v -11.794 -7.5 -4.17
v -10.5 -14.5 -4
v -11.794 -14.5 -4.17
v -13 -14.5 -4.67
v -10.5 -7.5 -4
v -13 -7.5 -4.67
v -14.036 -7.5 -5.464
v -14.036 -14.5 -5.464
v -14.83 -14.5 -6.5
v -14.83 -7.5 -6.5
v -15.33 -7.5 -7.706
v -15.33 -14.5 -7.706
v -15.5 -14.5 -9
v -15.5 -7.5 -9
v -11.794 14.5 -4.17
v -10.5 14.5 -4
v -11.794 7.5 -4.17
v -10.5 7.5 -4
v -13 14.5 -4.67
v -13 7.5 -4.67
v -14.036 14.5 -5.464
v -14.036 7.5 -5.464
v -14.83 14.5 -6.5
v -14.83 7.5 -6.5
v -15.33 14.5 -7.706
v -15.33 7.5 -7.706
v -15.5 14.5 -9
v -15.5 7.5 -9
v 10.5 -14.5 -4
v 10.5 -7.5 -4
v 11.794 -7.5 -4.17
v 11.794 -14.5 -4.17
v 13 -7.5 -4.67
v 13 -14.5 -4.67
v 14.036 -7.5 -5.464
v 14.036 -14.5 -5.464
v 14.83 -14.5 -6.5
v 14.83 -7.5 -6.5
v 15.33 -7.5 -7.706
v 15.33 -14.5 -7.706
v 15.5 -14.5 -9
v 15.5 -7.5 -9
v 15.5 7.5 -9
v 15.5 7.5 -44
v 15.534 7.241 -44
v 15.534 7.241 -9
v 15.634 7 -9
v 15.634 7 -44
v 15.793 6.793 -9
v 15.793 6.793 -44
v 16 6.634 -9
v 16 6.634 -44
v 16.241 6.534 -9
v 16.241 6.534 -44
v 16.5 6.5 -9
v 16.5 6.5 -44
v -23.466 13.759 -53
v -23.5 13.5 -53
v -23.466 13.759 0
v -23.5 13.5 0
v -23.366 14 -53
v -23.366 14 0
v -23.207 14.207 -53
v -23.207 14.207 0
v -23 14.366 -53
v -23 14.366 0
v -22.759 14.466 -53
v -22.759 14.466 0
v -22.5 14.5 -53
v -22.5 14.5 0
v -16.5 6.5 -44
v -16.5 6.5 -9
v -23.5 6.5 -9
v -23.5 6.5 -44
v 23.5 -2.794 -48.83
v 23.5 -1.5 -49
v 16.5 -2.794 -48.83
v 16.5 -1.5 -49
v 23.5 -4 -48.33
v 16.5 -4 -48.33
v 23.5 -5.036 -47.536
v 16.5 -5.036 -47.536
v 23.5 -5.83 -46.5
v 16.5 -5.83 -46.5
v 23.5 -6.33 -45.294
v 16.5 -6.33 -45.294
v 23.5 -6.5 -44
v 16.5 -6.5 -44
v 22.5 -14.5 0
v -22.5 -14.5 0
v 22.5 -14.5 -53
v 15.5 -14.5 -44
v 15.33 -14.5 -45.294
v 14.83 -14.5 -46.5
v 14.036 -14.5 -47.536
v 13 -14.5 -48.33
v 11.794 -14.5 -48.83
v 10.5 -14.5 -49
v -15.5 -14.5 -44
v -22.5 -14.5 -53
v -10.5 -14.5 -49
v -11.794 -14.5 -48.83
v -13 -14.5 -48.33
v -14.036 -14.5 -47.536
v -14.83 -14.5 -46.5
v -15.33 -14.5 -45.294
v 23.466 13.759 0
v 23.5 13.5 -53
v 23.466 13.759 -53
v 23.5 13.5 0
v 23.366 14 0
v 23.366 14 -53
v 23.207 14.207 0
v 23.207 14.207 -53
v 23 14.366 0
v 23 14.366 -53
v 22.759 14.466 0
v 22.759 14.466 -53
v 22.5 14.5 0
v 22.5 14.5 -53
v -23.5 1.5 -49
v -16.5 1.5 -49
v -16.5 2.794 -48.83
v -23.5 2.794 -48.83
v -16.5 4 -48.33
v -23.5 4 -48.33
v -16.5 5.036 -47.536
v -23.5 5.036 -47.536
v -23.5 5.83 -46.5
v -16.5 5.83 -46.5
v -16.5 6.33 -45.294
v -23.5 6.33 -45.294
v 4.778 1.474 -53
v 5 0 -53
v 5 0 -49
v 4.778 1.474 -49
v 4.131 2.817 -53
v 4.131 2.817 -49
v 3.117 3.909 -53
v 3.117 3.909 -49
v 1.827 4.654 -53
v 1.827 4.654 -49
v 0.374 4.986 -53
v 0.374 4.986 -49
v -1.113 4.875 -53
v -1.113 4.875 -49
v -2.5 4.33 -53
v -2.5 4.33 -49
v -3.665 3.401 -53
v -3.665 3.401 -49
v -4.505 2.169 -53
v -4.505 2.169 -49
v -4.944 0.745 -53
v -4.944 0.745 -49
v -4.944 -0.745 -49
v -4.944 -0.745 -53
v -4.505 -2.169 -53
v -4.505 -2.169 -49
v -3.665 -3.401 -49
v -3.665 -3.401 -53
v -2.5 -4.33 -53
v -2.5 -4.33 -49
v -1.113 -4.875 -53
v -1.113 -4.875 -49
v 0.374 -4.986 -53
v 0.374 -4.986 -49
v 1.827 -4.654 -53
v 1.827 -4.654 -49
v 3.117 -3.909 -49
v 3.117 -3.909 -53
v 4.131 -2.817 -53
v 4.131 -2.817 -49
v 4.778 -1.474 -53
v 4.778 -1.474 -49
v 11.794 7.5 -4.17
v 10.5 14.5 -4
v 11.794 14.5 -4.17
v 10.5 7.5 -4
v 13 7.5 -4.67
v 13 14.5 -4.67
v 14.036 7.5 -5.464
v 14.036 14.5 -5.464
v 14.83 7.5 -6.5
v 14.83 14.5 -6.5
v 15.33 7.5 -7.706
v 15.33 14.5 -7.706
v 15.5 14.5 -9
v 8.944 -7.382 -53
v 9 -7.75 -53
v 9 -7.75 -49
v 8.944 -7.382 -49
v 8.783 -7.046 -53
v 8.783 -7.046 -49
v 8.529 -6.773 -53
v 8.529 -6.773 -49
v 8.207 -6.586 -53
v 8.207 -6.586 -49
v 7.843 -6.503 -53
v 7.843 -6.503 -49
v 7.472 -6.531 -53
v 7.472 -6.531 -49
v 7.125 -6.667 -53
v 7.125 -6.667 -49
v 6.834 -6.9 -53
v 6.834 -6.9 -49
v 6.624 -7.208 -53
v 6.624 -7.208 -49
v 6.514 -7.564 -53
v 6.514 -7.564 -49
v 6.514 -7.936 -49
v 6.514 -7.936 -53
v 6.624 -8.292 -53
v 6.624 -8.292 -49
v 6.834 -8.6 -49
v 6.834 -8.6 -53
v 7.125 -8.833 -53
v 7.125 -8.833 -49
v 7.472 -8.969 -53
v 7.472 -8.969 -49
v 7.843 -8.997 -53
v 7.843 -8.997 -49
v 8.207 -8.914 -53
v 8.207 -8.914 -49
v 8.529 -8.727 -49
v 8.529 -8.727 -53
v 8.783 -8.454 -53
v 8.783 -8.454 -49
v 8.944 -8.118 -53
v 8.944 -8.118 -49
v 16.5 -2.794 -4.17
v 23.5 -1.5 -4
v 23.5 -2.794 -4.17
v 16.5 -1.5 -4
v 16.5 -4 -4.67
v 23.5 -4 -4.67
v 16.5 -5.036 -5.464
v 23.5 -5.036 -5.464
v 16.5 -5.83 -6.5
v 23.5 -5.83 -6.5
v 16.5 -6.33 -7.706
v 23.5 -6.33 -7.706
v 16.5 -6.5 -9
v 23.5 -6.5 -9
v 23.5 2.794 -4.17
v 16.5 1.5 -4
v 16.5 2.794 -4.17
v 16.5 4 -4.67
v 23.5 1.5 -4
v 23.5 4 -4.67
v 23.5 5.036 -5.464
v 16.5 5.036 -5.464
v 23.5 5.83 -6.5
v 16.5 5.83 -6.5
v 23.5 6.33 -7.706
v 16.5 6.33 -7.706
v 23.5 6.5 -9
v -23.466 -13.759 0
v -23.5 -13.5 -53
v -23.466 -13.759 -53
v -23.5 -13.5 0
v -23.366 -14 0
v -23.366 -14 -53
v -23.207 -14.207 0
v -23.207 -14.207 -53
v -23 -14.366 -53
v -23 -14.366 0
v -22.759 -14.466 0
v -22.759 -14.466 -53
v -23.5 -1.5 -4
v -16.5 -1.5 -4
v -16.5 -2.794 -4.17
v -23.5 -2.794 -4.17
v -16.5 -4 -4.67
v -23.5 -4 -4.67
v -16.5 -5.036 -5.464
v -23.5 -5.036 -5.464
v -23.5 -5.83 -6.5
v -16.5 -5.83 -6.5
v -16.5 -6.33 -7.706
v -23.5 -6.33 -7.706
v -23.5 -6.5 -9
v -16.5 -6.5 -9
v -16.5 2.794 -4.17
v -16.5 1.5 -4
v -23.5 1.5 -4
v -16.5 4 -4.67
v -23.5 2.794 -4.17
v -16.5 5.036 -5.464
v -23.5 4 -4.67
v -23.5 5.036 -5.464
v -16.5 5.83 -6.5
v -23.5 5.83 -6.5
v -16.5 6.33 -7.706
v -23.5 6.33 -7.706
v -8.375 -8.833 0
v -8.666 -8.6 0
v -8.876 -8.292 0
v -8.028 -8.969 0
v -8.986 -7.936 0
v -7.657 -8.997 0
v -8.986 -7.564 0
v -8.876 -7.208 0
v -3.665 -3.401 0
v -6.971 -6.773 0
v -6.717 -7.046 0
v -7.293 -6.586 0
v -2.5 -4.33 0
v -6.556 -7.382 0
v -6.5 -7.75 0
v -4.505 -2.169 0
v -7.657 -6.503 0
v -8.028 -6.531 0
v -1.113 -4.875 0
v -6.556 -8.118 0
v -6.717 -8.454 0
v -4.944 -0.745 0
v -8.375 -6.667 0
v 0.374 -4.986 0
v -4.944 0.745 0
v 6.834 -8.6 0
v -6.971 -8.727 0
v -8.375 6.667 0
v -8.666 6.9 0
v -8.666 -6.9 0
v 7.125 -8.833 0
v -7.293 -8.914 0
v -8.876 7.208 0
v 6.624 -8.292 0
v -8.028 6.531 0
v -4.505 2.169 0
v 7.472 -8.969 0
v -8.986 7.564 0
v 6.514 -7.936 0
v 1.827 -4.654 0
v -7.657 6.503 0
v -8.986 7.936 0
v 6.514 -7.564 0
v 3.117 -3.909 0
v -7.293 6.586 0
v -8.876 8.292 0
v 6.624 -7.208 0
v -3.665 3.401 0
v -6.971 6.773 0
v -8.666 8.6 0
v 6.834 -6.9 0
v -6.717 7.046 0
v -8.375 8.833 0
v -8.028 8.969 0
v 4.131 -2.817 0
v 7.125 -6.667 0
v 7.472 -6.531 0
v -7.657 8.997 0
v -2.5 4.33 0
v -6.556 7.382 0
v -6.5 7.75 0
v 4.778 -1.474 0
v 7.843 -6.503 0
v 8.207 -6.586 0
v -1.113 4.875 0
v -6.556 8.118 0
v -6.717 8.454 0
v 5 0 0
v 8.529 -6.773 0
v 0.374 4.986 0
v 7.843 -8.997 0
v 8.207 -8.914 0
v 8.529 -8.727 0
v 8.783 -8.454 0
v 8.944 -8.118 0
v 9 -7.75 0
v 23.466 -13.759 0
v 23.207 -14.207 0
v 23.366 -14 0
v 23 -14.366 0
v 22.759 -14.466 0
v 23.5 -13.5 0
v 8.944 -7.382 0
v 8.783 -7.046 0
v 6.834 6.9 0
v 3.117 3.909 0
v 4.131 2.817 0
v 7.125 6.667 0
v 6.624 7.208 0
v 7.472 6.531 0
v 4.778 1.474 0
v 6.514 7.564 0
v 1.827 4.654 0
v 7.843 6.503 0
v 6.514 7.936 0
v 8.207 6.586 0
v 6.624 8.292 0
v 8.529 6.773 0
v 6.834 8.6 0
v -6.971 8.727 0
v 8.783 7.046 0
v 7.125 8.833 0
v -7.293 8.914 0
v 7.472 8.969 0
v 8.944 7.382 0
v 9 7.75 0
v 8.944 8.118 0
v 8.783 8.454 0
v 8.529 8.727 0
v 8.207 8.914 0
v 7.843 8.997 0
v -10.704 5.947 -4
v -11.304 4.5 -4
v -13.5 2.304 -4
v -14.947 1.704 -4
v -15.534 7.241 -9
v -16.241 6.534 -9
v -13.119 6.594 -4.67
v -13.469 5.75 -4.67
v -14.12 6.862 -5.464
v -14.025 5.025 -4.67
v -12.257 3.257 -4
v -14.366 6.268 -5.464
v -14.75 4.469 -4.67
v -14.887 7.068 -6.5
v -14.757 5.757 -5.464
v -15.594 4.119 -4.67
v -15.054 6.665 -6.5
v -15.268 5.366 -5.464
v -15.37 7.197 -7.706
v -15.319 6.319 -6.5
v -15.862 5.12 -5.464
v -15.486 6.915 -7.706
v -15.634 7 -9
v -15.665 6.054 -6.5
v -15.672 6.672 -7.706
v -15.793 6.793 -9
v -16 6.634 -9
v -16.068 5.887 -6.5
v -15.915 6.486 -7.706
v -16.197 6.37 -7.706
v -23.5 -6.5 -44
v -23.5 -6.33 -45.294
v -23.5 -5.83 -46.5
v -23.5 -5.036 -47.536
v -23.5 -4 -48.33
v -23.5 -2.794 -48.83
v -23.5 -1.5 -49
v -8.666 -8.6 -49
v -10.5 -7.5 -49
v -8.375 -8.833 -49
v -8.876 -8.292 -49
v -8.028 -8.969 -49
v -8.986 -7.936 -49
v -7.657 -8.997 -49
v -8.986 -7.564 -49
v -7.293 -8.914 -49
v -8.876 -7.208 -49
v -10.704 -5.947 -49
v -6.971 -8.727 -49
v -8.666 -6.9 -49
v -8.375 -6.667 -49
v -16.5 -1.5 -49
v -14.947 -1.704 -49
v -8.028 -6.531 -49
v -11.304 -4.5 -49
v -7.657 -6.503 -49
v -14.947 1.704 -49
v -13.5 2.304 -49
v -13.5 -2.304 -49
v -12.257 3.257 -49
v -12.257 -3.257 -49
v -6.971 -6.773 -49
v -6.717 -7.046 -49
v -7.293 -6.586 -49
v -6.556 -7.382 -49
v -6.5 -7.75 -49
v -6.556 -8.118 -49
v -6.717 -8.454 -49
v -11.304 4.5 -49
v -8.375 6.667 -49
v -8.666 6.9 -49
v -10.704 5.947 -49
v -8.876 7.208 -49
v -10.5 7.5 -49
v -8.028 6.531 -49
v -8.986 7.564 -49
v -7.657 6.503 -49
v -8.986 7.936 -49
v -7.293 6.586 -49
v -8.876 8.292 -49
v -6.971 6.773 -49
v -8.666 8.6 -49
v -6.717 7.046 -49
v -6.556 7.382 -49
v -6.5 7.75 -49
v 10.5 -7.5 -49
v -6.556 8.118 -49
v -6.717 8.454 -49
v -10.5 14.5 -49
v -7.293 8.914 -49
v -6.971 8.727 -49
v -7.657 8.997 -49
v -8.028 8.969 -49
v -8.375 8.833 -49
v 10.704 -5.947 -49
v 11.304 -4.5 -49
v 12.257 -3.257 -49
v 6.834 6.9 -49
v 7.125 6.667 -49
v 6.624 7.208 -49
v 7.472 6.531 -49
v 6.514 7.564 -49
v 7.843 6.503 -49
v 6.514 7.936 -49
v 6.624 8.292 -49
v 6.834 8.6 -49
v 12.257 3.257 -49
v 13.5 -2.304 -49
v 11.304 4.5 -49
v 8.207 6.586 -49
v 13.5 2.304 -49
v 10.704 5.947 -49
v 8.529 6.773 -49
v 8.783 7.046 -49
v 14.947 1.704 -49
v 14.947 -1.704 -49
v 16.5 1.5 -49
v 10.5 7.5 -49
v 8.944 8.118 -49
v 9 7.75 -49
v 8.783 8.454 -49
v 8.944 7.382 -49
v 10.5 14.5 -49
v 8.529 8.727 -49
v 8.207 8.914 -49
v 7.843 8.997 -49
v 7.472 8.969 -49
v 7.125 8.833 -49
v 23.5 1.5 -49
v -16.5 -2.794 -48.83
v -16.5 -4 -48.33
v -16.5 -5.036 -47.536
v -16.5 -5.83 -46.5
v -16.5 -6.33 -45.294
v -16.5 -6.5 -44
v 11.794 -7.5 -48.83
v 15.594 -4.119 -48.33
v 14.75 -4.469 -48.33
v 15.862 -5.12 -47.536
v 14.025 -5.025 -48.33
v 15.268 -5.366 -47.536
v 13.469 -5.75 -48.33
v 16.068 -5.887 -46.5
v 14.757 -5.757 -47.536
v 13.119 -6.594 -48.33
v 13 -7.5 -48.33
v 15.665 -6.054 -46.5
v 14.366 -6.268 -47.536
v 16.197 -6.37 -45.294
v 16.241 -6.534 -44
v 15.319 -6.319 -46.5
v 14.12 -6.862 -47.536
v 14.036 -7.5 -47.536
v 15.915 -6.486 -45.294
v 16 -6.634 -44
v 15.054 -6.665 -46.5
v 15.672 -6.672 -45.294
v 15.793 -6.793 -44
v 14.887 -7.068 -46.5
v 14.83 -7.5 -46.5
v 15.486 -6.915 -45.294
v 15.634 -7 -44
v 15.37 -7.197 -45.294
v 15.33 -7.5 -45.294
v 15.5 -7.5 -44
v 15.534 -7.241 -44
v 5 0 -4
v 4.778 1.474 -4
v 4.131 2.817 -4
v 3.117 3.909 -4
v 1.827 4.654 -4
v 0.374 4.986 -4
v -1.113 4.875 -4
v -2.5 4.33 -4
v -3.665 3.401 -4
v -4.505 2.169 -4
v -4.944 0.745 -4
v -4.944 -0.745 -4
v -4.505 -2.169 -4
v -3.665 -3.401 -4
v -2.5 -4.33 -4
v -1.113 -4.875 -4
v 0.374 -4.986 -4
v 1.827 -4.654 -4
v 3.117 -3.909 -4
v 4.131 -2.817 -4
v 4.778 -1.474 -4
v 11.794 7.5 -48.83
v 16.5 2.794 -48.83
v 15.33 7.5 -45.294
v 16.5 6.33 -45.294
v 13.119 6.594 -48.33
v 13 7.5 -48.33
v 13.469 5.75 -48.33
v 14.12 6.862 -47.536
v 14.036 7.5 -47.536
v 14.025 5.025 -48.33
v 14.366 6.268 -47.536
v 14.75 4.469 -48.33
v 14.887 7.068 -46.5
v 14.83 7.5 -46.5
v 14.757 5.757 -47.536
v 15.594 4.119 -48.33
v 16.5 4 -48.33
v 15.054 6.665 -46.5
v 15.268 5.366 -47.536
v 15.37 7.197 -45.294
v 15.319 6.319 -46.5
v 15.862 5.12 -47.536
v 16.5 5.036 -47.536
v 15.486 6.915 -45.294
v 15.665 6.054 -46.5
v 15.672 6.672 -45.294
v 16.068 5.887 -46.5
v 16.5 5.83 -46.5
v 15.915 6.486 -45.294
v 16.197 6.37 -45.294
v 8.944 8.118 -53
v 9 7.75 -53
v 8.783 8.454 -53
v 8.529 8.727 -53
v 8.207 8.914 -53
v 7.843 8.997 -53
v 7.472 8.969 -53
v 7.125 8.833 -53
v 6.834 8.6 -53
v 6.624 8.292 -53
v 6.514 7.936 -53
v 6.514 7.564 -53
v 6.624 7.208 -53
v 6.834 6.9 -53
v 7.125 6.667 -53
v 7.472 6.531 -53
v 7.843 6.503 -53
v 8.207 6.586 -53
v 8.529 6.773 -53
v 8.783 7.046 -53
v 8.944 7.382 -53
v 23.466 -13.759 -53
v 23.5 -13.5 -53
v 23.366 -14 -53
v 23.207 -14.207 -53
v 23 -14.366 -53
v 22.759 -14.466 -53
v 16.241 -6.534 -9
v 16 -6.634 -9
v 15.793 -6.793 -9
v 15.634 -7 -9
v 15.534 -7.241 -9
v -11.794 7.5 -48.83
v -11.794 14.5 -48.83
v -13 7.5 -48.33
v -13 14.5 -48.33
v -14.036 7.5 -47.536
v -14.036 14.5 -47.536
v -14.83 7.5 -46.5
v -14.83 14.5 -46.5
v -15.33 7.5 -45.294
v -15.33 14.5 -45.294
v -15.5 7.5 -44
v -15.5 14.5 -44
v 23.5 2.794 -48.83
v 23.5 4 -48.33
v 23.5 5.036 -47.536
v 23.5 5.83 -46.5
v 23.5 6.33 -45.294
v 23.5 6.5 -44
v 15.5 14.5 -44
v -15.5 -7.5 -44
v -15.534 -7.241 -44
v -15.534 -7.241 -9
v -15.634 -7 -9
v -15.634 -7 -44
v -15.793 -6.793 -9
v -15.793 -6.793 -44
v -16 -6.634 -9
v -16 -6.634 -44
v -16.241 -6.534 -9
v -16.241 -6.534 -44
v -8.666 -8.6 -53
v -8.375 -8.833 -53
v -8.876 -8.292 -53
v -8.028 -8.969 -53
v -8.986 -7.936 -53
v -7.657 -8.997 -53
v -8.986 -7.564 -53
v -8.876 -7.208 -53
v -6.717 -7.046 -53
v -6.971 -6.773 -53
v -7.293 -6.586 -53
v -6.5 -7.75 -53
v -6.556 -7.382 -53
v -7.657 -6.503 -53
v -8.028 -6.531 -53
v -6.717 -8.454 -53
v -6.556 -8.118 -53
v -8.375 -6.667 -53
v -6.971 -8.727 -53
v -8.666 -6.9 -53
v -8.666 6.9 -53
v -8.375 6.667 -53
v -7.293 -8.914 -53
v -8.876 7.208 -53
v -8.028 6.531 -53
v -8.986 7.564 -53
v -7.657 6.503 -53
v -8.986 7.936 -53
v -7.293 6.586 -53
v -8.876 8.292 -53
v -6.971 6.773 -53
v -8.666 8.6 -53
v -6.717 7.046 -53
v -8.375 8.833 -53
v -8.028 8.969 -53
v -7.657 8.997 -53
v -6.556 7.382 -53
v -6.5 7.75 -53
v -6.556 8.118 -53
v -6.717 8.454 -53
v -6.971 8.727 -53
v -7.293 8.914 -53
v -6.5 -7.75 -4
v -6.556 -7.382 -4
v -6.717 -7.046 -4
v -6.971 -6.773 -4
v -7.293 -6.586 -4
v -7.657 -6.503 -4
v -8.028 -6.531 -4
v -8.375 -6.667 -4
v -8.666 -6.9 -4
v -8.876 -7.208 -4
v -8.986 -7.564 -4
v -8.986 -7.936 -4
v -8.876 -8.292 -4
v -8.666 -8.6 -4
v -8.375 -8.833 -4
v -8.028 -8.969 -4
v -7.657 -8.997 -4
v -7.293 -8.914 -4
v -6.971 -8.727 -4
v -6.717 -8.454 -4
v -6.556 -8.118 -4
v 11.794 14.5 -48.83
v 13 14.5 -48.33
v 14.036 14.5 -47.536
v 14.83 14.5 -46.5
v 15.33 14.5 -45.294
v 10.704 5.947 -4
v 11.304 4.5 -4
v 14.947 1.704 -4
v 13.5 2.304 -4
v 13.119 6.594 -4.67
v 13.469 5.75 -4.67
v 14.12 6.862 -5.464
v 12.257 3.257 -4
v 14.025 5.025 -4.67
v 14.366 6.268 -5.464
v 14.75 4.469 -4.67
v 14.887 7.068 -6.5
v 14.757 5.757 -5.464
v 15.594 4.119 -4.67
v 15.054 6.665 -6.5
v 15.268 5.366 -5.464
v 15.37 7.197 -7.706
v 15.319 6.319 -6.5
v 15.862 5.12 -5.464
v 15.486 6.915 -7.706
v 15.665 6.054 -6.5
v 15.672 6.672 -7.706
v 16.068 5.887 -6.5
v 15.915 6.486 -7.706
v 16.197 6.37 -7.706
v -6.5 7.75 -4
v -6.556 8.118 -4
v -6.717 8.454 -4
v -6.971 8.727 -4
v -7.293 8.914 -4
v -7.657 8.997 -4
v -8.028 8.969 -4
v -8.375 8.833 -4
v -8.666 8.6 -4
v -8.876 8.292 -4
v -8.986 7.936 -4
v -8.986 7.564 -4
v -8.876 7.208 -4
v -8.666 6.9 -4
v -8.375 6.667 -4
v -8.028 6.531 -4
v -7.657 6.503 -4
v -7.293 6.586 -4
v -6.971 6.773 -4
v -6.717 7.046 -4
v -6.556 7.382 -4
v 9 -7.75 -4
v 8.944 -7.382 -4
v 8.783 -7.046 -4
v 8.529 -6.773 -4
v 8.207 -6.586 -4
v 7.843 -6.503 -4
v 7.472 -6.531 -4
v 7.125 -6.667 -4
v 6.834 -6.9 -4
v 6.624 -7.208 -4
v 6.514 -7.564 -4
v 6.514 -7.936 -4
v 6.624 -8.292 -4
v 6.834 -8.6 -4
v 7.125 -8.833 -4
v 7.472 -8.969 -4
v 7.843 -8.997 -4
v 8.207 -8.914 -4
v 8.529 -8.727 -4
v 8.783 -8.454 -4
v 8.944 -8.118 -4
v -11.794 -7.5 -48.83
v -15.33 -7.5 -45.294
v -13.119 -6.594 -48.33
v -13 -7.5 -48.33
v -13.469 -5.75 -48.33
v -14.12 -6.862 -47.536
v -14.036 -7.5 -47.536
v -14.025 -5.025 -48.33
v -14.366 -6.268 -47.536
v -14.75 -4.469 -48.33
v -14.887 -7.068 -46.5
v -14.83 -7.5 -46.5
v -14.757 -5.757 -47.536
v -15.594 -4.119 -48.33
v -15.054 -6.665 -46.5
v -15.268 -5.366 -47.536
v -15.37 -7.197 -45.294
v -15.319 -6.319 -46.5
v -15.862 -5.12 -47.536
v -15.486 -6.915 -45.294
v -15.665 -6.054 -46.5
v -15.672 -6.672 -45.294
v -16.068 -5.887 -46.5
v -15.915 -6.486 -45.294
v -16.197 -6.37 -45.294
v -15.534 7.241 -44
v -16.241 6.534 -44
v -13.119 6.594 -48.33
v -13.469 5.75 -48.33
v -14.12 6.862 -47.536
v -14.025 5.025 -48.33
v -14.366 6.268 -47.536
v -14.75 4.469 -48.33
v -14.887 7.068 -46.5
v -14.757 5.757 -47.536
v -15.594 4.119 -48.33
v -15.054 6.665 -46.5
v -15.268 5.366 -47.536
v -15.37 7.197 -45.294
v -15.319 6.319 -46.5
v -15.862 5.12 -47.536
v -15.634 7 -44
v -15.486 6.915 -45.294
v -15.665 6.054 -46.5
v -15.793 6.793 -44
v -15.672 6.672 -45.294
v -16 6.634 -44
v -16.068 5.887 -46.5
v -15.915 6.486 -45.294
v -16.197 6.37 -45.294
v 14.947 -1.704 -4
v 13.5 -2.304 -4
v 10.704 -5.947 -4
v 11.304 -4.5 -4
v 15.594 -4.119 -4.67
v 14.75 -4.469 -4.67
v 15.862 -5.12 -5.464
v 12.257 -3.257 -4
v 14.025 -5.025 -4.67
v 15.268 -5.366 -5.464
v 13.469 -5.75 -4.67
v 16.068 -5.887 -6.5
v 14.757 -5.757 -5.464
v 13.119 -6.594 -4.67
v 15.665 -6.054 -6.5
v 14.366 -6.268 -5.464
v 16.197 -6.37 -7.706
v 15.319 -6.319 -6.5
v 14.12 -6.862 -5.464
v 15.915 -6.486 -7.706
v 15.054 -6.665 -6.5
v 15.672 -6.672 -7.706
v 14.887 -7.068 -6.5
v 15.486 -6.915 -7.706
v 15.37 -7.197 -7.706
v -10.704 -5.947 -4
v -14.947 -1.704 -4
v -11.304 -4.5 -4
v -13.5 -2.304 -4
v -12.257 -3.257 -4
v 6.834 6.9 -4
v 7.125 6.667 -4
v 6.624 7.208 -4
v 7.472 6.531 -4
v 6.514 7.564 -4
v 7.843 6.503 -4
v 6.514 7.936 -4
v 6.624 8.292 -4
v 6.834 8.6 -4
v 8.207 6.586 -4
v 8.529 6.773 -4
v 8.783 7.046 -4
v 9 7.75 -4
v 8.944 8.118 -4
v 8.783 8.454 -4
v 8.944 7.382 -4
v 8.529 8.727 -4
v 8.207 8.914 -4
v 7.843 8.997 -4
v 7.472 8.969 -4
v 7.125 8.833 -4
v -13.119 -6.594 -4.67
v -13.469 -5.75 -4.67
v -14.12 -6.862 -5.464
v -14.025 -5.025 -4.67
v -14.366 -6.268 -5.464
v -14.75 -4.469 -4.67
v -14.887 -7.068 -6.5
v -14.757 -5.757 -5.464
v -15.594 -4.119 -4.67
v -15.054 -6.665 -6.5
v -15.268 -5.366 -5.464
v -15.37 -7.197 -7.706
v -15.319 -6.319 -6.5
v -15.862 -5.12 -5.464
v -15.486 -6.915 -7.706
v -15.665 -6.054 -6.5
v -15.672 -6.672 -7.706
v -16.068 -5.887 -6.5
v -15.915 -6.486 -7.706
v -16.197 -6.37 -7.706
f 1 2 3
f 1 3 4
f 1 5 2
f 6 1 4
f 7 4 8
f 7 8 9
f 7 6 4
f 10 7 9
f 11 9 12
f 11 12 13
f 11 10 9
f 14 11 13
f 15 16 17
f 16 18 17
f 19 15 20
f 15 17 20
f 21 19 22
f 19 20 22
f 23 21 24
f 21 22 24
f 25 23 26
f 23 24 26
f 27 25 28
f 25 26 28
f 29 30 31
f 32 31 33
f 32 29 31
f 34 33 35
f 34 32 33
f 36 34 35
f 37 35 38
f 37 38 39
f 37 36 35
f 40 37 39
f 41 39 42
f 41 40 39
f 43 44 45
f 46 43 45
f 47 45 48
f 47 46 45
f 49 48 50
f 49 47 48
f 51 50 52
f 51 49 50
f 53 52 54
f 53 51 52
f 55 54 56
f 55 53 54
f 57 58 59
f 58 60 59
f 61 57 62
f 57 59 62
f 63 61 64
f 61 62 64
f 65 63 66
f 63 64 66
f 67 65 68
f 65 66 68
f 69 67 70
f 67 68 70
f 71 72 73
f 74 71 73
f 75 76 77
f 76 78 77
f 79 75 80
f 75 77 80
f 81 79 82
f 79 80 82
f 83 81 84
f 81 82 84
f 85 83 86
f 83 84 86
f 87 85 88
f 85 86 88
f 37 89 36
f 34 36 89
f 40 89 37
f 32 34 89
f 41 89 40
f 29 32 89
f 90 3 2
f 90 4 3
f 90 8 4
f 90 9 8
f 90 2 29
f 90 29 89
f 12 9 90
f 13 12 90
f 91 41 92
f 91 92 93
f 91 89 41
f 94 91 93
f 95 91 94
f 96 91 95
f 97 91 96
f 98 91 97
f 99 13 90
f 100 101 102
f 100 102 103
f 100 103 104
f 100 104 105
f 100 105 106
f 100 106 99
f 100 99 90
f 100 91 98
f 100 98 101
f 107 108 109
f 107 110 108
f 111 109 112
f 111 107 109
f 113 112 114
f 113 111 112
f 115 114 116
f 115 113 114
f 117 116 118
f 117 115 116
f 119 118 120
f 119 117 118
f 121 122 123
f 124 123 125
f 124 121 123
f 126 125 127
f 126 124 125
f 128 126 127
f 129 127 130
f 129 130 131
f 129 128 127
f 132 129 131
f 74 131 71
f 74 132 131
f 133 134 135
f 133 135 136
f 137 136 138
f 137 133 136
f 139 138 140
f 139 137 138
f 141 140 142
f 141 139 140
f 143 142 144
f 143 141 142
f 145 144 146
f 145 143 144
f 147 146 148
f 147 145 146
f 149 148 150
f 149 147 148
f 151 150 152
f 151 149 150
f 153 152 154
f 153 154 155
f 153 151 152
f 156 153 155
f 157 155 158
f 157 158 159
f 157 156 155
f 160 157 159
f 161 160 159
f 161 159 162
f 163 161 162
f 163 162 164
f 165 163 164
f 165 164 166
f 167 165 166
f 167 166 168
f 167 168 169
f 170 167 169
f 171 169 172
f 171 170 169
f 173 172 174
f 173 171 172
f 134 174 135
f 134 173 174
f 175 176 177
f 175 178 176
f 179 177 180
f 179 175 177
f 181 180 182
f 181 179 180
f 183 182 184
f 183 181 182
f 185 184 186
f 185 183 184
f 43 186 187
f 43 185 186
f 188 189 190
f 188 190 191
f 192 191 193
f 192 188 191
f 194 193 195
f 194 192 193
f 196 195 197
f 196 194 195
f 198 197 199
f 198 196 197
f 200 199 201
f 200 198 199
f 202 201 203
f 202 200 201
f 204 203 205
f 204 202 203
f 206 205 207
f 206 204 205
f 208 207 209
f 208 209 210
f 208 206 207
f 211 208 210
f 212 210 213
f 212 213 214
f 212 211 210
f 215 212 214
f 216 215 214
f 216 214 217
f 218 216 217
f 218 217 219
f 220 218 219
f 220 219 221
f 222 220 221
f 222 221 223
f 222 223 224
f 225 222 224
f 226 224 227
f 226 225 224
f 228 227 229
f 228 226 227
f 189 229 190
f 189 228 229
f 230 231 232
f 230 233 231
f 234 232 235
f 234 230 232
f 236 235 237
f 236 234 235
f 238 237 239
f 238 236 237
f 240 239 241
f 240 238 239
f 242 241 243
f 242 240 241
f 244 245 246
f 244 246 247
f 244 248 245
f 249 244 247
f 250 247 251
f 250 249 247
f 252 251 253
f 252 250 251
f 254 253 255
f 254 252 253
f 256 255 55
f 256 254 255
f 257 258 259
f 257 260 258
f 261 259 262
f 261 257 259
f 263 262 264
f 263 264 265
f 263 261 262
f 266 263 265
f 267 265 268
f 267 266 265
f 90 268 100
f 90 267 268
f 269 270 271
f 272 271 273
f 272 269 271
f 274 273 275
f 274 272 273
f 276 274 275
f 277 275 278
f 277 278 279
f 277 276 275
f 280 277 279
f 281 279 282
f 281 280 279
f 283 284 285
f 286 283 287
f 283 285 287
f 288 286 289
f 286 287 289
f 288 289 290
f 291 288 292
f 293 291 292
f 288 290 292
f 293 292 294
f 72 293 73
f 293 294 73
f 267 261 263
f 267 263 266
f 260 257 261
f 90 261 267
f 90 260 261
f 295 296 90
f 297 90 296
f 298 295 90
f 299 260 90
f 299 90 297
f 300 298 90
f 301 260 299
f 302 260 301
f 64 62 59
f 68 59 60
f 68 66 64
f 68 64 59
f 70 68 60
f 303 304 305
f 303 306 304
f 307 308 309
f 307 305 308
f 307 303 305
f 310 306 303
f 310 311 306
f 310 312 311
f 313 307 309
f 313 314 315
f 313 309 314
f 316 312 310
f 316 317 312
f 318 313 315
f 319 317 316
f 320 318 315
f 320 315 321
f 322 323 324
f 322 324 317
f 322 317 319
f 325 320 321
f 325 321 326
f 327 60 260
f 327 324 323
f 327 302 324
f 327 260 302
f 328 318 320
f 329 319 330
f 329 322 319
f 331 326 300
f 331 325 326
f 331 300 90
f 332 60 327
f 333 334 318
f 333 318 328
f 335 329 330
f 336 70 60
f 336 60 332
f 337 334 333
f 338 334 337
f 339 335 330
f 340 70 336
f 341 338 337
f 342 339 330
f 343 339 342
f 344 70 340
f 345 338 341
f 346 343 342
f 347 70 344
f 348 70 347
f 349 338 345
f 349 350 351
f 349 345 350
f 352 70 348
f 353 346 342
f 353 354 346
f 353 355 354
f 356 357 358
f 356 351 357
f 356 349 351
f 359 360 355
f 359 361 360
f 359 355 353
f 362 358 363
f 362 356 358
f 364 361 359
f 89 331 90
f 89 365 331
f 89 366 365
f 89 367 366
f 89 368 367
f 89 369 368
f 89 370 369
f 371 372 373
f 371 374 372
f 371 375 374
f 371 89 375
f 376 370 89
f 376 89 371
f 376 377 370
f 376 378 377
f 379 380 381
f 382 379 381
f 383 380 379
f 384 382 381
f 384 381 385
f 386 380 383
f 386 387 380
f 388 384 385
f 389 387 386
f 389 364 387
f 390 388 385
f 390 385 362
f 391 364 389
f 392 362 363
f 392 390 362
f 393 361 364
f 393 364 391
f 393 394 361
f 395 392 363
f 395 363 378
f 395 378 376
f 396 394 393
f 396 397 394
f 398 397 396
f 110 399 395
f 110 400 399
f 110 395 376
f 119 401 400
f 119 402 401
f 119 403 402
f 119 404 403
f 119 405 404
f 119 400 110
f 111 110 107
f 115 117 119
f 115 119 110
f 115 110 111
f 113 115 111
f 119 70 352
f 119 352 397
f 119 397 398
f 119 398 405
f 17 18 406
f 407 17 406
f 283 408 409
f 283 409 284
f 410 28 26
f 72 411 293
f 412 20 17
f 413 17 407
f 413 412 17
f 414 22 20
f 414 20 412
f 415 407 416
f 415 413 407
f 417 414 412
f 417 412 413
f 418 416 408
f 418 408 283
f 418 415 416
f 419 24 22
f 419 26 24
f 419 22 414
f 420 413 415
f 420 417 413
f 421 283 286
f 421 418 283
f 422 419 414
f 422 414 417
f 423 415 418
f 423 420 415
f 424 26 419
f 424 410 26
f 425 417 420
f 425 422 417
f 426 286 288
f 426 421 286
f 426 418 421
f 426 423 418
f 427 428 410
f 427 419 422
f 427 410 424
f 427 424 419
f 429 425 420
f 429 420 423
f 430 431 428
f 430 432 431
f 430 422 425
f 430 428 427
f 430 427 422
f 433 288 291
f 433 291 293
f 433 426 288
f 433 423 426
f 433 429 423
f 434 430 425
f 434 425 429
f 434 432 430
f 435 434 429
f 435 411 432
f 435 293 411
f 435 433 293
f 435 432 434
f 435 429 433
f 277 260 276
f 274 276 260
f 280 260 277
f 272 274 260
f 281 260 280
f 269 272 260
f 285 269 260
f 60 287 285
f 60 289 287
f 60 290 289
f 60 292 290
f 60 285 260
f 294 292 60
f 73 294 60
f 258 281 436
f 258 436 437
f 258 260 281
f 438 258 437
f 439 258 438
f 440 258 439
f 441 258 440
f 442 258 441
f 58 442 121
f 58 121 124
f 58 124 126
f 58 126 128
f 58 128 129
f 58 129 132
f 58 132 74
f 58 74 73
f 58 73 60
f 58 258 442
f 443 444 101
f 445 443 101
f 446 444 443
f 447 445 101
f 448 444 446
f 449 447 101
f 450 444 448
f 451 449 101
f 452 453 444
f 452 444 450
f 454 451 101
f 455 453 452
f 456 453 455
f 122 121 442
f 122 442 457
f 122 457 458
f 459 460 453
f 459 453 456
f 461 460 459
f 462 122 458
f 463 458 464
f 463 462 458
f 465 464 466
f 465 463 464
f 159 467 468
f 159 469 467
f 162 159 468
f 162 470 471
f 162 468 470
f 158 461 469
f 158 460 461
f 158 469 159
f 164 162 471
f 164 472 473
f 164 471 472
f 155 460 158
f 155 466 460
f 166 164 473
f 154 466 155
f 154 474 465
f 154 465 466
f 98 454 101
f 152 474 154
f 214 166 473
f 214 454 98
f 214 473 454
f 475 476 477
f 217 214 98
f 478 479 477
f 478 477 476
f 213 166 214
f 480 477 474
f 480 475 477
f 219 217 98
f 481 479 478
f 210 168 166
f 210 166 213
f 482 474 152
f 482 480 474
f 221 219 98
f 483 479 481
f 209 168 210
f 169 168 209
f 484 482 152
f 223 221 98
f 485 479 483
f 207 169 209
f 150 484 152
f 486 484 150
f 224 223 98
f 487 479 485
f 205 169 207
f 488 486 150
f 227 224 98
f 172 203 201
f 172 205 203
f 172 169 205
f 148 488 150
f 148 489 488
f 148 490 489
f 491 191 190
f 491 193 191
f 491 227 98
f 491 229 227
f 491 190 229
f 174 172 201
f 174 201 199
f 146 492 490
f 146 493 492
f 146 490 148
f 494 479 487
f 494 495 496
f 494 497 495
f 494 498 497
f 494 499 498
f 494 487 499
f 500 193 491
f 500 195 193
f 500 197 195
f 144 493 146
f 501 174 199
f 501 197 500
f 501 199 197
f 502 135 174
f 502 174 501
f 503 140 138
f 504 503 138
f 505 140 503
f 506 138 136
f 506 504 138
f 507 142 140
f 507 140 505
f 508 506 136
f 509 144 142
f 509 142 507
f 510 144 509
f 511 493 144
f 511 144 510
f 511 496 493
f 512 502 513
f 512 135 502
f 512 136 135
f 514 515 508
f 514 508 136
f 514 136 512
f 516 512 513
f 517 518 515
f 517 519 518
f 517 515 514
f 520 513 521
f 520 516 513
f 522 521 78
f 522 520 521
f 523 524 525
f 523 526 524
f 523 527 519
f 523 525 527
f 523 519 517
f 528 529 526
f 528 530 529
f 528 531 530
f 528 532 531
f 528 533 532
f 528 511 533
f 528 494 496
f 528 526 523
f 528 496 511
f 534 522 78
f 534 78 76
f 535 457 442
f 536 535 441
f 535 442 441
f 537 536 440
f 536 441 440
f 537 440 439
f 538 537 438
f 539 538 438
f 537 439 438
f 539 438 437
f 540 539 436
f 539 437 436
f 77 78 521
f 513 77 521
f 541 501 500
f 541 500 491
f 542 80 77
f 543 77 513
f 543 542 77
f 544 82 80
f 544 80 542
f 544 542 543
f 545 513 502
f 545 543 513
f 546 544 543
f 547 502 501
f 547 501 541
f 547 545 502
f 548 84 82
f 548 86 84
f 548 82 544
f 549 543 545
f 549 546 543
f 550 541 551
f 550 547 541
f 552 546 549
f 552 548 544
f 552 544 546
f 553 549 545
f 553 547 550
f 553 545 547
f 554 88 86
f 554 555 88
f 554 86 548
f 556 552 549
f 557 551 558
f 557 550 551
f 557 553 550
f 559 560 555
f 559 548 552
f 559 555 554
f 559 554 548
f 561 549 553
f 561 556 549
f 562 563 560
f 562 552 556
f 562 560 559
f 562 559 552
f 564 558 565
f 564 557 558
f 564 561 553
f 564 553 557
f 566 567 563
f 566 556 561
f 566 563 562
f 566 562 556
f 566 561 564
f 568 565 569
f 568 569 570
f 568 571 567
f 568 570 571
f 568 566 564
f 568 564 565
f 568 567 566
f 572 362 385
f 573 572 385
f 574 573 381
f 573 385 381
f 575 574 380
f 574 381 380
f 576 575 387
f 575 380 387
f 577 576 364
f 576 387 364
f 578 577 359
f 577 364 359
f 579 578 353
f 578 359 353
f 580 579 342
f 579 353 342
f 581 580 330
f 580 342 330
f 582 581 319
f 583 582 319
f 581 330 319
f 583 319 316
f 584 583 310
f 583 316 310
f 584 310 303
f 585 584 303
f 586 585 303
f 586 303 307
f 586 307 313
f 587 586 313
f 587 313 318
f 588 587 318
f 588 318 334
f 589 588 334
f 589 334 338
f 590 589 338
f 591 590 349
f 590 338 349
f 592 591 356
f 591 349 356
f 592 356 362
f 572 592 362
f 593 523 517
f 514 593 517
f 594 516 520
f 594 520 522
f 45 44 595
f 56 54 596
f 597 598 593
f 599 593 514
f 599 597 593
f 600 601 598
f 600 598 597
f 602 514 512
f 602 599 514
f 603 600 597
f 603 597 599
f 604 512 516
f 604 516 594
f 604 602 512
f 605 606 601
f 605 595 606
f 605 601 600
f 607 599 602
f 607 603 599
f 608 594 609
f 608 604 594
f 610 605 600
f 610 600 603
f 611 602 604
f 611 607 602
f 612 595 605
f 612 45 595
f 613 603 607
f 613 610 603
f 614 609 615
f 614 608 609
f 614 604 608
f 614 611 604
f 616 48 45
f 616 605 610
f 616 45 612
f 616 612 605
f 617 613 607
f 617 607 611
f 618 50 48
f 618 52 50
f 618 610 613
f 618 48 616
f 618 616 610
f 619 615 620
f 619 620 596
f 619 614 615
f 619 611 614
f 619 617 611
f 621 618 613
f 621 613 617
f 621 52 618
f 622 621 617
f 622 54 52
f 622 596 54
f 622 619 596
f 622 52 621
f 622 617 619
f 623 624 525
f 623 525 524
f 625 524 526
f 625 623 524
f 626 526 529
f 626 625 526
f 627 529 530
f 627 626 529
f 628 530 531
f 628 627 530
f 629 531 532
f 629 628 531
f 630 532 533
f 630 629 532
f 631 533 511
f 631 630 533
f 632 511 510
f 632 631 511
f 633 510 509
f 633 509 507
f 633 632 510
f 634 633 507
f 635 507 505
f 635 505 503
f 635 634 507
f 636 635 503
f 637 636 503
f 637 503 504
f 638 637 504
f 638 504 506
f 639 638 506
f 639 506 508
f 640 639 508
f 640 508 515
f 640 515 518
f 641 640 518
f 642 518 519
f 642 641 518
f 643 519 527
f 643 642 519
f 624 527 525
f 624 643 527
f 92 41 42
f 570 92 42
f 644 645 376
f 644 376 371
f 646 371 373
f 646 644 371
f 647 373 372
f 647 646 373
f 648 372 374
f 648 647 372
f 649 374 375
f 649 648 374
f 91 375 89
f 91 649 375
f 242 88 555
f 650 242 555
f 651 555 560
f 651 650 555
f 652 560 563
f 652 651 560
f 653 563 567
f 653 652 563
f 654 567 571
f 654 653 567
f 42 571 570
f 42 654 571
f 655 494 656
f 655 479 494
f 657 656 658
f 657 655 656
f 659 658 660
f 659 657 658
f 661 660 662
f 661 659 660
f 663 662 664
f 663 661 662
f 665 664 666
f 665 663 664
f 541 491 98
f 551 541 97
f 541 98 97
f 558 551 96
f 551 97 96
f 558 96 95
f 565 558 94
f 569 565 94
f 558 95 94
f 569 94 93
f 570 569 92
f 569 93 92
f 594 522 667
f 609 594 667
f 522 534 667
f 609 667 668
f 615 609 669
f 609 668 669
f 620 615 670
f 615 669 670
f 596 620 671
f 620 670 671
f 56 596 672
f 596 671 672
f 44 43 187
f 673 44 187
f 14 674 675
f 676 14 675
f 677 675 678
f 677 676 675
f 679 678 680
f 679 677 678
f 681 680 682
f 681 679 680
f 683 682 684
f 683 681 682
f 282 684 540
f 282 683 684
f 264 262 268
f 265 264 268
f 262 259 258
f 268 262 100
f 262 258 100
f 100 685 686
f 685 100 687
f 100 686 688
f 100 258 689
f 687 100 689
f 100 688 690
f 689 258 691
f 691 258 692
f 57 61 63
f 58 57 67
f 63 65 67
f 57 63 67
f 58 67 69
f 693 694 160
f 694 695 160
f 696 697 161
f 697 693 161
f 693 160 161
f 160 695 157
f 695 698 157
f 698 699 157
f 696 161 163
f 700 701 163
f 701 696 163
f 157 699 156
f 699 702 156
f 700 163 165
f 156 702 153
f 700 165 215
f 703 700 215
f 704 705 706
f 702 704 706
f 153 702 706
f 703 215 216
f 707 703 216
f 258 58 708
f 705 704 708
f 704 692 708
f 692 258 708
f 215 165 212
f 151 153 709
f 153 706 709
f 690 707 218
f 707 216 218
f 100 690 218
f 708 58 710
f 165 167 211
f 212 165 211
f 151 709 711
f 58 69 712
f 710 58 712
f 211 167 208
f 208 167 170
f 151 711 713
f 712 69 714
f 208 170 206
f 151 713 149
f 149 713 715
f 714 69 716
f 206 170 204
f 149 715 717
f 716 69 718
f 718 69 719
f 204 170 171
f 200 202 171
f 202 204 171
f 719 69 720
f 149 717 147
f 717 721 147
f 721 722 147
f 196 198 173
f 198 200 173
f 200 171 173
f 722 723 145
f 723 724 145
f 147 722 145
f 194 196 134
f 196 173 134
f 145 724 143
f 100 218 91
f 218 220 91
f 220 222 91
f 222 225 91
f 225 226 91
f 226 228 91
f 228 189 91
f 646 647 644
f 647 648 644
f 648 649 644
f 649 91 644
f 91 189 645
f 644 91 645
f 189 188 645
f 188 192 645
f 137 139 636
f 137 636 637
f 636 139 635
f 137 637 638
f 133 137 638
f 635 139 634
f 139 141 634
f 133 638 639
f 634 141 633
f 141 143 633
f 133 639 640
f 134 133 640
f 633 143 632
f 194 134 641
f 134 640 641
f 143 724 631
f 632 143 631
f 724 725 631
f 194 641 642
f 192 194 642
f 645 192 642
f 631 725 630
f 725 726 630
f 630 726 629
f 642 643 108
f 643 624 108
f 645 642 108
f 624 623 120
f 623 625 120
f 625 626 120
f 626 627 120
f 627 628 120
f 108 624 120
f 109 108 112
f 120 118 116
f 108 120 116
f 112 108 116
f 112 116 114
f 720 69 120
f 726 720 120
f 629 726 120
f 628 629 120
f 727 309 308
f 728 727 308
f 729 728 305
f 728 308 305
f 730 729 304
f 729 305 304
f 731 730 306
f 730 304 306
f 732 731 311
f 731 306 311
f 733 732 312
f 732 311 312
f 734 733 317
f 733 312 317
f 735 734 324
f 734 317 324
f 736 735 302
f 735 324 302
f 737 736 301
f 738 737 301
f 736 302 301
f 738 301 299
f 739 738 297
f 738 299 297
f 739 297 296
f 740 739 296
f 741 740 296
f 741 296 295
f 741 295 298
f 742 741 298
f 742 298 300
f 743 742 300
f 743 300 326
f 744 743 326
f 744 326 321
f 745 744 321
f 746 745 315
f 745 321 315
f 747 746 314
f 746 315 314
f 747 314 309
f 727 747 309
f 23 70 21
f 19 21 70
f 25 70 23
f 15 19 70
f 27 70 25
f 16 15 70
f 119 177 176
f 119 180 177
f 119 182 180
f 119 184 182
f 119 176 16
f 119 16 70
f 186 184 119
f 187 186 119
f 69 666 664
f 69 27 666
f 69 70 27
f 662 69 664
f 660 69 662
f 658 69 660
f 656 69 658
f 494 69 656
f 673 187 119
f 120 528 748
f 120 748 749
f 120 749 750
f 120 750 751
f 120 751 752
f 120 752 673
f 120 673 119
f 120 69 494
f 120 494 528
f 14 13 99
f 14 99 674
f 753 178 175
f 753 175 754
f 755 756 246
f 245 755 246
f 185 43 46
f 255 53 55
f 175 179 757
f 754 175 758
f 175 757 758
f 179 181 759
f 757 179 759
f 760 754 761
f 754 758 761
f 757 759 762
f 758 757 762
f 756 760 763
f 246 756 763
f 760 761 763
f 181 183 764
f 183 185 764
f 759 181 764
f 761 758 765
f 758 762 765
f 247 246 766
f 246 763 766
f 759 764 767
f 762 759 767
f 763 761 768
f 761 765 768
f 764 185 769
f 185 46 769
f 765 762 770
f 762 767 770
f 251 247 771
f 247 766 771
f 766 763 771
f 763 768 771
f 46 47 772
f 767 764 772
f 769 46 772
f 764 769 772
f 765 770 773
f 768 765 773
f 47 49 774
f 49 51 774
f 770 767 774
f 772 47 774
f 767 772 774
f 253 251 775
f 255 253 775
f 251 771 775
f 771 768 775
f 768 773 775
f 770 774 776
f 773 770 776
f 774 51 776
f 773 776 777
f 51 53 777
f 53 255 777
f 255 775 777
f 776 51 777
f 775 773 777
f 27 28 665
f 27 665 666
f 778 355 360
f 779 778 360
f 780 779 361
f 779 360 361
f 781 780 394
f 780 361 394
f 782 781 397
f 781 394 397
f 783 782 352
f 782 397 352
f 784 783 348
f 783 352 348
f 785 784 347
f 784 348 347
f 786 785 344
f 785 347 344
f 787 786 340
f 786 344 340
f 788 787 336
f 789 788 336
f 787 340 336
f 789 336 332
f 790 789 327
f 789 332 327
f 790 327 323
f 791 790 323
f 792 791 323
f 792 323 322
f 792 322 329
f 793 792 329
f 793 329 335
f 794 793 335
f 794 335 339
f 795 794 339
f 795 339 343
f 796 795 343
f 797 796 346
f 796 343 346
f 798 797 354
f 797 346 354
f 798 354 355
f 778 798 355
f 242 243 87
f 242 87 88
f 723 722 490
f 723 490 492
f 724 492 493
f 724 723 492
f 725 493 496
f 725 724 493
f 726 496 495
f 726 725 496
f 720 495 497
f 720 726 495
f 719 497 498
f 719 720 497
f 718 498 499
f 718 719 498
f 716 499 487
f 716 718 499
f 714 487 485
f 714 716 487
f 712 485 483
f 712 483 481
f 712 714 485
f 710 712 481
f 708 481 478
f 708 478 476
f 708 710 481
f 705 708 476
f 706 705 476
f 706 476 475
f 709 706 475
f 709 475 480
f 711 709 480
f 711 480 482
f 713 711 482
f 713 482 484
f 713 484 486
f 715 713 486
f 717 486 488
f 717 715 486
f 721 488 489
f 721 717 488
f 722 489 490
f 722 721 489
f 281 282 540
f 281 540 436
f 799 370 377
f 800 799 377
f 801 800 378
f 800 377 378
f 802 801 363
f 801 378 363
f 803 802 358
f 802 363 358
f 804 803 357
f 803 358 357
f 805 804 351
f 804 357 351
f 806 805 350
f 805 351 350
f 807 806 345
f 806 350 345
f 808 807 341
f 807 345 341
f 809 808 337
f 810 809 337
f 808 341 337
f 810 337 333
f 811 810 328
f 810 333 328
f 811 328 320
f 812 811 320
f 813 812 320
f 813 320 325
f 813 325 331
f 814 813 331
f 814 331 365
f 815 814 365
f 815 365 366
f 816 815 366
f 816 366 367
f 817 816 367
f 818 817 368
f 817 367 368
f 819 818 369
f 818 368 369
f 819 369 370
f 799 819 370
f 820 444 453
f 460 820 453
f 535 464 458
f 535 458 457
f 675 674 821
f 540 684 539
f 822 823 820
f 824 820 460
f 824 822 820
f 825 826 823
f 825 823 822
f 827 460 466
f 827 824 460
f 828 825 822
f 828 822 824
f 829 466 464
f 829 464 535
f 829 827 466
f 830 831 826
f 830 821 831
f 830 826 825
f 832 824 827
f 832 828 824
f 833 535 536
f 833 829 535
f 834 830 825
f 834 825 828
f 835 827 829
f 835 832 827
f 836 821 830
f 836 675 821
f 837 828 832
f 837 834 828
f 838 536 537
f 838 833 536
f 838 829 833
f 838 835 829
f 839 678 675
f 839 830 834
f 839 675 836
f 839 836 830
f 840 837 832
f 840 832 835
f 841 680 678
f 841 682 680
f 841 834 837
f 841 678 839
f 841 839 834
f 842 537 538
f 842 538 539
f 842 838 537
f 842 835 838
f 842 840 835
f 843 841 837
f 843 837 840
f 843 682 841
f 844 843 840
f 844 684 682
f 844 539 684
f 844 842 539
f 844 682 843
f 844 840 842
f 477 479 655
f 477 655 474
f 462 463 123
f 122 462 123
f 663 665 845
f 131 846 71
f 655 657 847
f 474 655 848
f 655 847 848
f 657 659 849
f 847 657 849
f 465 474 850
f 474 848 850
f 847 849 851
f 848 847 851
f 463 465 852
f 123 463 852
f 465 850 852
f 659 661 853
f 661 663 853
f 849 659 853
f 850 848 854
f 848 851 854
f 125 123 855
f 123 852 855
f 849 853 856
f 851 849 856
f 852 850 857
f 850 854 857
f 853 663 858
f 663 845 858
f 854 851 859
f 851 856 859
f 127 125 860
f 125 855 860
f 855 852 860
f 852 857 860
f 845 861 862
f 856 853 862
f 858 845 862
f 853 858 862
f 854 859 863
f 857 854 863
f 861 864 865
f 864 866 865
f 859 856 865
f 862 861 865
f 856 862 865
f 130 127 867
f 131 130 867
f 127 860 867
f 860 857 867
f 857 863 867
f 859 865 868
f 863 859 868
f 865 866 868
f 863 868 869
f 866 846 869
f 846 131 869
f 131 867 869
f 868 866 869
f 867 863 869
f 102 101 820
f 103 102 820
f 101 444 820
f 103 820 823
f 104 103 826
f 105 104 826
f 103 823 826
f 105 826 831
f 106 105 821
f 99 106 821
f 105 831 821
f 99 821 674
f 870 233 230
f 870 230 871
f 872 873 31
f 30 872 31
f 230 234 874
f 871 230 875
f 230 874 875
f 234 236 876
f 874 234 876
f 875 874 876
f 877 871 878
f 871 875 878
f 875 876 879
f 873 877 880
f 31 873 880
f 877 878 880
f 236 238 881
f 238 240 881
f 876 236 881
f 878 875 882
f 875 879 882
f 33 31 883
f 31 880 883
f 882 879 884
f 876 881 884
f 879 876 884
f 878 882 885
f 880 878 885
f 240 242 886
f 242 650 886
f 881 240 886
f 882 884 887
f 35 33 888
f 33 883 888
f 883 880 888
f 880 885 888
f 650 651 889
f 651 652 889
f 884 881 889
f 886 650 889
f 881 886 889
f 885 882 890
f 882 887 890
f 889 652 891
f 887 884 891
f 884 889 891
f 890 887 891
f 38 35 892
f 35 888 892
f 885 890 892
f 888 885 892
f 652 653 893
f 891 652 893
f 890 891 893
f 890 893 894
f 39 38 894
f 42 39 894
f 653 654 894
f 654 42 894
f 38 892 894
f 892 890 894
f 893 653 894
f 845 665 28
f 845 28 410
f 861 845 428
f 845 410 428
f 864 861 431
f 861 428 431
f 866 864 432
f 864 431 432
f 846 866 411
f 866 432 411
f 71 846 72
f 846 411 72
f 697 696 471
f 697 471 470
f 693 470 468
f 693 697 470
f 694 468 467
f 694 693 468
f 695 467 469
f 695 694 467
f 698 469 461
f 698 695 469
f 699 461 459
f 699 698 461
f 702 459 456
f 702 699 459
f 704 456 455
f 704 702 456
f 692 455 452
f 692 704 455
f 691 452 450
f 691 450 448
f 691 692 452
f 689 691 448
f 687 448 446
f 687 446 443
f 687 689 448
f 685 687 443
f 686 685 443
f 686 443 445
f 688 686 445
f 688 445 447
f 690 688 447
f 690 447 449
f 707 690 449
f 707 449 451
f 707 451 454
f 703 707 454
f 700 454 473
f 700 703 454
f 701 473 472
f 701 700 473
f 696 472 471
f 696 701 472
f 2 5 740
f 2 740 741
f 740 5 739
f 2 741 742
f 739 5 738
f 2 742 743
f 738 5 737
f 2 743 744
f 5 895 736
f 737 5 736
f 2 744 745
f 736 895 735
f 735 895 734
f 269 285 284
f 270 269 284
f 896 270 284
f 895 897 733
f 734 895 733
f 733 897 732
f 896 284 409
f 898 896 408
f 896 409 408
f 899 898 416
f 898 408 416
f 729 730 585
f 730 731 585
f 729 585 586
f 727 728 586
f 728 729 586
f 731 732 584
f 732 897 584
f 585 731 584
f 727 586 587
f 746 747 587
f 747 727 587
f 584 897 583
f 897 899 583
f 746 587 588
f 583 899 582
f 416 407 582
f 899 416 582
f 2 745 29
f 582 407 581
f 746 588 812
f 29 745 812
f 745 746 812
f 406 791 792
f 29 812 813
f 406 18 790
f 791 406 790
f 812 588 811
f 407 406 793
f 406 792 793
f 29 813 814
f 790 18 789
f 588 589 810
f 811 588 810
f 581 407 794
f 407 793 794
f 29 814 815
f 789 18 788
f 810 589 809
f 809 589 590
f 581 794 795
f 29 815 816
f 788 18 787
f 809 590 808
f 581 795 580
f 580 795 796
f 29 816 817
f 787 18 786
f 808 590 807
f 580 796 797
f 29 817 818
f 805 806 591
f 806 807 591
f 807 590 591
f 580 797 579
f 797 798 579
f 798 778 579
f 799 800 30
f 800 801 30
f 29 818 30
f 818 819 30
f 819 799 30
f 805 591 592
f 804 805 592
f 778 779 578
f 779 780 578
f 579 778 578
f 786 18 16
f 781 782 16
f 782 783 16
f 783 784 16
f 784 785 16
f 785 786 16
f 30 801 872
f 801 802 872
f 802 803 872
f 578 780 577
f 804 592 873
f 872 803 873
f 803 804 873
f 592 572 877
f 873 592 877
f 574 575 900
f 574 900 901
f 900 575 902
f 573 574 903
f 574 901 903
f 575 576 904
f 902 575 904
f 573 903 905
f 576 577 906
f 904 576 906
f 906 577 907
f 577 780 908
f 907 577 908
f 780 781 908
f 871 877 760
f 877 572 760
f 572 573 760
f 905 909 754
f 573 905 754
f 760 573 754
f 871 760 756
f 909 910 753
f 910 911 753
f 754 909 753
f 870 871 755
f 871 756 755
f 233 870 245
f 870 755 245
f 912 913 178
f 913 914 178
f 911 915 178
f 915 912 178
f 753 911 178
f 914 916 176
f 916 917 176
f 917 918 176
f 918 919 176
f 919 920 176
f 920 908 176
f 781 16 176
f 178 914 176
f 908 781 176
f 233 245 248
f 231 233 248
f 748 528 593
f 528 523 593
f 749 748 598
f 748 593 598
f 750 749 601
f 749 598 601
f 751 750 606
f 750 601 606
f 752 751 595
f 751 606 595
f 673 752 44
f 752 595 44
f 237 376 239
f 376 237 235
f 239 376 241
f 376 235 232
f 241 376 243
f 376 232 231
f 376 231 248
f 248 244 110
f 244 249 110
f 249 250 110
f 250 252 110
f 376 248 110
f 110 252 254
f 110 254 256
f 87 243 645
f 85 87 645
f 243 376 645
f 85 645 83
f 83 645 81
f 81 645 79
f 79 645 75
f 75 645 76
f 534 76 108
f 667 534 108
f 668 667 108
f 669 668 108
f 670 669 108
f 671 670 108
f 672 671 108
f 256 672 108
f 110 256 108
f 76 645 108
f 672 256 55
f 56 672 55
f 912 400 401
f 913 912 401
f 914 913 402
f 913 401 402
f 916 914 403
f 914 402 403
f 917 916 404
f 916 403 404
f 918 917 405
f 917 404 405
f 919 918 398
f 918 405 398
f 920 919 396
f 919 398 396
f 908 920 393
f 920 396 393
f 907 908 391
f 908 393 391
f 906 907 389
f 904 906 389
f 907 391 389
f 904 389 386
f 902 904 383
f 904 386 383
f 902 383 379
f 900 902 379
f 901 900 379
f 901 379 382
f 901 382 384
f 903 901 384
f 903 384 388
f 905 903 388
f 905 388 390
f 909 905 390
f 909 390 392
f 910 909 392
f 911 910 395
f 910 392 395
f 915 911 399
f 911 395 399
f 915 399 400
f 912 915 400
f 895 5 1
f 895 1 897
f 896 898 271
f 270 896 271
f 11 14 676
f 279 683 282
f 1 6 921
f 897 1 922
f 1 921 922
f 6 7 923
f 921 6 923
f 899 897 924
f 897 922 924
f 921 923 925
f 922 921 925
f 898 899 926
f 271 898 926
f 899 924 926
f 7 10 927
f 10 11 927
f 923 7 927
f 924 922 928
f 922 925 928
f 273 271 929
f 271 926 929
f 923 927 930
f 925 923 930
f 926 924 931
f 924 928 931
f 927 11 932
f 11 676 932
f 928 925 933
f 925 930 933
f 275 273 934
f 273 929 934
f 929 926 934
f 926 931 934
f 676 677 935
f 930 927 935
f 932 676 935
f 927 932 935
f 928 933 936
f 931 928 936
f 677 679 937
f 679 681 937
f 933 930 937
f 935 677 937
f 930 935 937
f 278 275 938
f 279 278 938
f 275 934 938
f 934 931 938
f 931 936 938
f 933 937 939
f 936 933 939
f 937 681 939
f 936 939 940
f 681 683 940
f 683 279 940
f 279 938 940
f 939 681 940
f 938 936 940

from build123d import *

# Parameters (mm, degrees)
SKETCH1_W            = 47
SKETCH1_H            = 29
SKETCH1_R            = 1.25
SKETCH1_R_2          = 5
BOSS_EXTRUDE1_DEPTH  = 4
SKETCH3_W            = 8
SKETCH3_H            = 8
BOSS_EXTRUDE2_DEPTH  = 22.5
FILLET1_R            = 1
FILLET2_R            = 5
FILLET1_OF_MIRROR3_R = 1
FILLET2_OF_MIRROR3_R = 5


with BuildPart() as part:
    # Sketch1 → Boss-Extrude1 (new body)
    with BuildSketch(Plane.XY):
        Rectangle(SKETCH1_W, SKETCH1_H)
        with Locations((7.75, -7.75)):
            Circle(SKETCH1_R, mode=Mode.SUBTRACT)
        with Locations((7.75, 7.75)):
            Circle(SKETCH1_R, mode=Mode.SUBTRACT)
        with Locations((-7.75, 7.75)):
            Circle(SKETCH1_R, mode=Mode.SUBTRACT)
        Circle(SKETCH1_R_2, mode=Mode.SUBTRACT)
        with Locations((-7.75, -7.75)):
            Circle(SKETCH1_R, mode=Mode.SUBTRACT)
    boss_extrude1 = extrude(amount=-BOSS_EXTRUDE1_DEPTH)

    # Sketch3 → Boss-Extrude2 (add)
    with BuildSketch(Plane(origin=(0, 0, -4), x_dir=(-1, 0, 0), z_dir=(0, 0, -1))):
        with Locations((19.5, -10.5)):
            Rectangle(SKETCH3_W, SKETCH3_H)
        with Locations((-19.5, -10.5)):
            Rectangle(SKETCH3_W, SKETCH3_H)
        with Locations((-19.5, 10.5)):
            Rectangle(SKETCH3_W, SKETCH3_H)
        with Locations((19.5, 10.5)):
            Rectangle(SKETCH3_W, SKETCH3_H)
    boss_extrude2 = extrude(amount=BOSS_EXTRUDE2_DEPTH)

    # Fillet1
    fillet1_edges = [part.edges().sort_by_distance(p)[0] for p in [
        (15.5, 6.5, -15.25),
        (-15.5, 6.5, -15.25),
        (-15.5, -6.5, -15.25),
        (15.5, -6.5, -15.25),
        (23.5, -14.5, -13.25),
        (23.5, 14.5, -13.25),
        (-23.5, 14.5, -13.25),
        (-23.5, -14.5, -13.25),
    ]]
    fillet(fillet1_edges, radius=FILLET1_R)

    # Fillet2
    fillet2_edges = [part.edges().sort_by_distance(p)[0] for p in [
        (15.5, -11, -4),
        (15.792893219, -6.792893219, -4),
        (-15.5, -11, -4),
        (-15.792893219, -6.792893219, -4),
        (-15.5, 11, -4),
        (-15.792893219, 6.792893219, -4),
        (15.5, 11, -4),
        (15.792893219, 6.792893219, -4),
        (20, -6.5, -4),
        (-20, -6.5, -4),
        (-20, 6.5, -4),
        (20, 6.5, -4),
    ]]
    fillet(fillet2_edges, radius=FILLET2_R)

    # Mirror3: Boss-Extrude1, Boss-Extrude2 across plane
    add(boss_extrude1.mirror(Plane.XY.offset(-26.5)))
    add(boss_extrude2.mirror(Plane.XY.offset(-26.5)))

    # Fillet1 of Mirror3
    fillet1_of_mirror3_edges = [part.edges().sort_by_distance(p)[0] for p in [
        (15.5, 6.5, -37.75),
        (-15.5, 6.5, -37.75),
        (-15.5, -6.5, -37.75),
        (15.5, -6.5, -37.75),
        (23.5, -14.5, -39.75),
        (23.5, 14.5, -39.75),
        (-23.5, 14.5, -39.75),
        (-23.5, -14.5, -39.75),
    ]]
    fillet(fillet1_of_mirror3_edges, radius=FILLET1_OF_MIRROR3_R)

    # Fillet2 of Mirror3
    fillet2_of_mirror3_edges = [part.edges().sort_by_distance(p)[0] for p in [
        (15.5, -11, -49),
        (15.792893219, -6.792893219, -49),
        (-15.5, -11, -49),
        (-15.792893219, -6.792893219, -49),
        (-15.5, 11, -49),
        (-15.792893219, 6.792893219, -49),
        (15.5, 11, -49),
        (15.792893219, 6.792893219, -49),
        (20, -6.5, -49),
        (-20, -6.5, -49),
        (-20, 6.5, -49),
        (20, 6.5, -49),
    ]]
    fillet(fillet2_of_mirror3_edges, radius=FILLET2_OF_MIRROR3_R)


solid = part.part
